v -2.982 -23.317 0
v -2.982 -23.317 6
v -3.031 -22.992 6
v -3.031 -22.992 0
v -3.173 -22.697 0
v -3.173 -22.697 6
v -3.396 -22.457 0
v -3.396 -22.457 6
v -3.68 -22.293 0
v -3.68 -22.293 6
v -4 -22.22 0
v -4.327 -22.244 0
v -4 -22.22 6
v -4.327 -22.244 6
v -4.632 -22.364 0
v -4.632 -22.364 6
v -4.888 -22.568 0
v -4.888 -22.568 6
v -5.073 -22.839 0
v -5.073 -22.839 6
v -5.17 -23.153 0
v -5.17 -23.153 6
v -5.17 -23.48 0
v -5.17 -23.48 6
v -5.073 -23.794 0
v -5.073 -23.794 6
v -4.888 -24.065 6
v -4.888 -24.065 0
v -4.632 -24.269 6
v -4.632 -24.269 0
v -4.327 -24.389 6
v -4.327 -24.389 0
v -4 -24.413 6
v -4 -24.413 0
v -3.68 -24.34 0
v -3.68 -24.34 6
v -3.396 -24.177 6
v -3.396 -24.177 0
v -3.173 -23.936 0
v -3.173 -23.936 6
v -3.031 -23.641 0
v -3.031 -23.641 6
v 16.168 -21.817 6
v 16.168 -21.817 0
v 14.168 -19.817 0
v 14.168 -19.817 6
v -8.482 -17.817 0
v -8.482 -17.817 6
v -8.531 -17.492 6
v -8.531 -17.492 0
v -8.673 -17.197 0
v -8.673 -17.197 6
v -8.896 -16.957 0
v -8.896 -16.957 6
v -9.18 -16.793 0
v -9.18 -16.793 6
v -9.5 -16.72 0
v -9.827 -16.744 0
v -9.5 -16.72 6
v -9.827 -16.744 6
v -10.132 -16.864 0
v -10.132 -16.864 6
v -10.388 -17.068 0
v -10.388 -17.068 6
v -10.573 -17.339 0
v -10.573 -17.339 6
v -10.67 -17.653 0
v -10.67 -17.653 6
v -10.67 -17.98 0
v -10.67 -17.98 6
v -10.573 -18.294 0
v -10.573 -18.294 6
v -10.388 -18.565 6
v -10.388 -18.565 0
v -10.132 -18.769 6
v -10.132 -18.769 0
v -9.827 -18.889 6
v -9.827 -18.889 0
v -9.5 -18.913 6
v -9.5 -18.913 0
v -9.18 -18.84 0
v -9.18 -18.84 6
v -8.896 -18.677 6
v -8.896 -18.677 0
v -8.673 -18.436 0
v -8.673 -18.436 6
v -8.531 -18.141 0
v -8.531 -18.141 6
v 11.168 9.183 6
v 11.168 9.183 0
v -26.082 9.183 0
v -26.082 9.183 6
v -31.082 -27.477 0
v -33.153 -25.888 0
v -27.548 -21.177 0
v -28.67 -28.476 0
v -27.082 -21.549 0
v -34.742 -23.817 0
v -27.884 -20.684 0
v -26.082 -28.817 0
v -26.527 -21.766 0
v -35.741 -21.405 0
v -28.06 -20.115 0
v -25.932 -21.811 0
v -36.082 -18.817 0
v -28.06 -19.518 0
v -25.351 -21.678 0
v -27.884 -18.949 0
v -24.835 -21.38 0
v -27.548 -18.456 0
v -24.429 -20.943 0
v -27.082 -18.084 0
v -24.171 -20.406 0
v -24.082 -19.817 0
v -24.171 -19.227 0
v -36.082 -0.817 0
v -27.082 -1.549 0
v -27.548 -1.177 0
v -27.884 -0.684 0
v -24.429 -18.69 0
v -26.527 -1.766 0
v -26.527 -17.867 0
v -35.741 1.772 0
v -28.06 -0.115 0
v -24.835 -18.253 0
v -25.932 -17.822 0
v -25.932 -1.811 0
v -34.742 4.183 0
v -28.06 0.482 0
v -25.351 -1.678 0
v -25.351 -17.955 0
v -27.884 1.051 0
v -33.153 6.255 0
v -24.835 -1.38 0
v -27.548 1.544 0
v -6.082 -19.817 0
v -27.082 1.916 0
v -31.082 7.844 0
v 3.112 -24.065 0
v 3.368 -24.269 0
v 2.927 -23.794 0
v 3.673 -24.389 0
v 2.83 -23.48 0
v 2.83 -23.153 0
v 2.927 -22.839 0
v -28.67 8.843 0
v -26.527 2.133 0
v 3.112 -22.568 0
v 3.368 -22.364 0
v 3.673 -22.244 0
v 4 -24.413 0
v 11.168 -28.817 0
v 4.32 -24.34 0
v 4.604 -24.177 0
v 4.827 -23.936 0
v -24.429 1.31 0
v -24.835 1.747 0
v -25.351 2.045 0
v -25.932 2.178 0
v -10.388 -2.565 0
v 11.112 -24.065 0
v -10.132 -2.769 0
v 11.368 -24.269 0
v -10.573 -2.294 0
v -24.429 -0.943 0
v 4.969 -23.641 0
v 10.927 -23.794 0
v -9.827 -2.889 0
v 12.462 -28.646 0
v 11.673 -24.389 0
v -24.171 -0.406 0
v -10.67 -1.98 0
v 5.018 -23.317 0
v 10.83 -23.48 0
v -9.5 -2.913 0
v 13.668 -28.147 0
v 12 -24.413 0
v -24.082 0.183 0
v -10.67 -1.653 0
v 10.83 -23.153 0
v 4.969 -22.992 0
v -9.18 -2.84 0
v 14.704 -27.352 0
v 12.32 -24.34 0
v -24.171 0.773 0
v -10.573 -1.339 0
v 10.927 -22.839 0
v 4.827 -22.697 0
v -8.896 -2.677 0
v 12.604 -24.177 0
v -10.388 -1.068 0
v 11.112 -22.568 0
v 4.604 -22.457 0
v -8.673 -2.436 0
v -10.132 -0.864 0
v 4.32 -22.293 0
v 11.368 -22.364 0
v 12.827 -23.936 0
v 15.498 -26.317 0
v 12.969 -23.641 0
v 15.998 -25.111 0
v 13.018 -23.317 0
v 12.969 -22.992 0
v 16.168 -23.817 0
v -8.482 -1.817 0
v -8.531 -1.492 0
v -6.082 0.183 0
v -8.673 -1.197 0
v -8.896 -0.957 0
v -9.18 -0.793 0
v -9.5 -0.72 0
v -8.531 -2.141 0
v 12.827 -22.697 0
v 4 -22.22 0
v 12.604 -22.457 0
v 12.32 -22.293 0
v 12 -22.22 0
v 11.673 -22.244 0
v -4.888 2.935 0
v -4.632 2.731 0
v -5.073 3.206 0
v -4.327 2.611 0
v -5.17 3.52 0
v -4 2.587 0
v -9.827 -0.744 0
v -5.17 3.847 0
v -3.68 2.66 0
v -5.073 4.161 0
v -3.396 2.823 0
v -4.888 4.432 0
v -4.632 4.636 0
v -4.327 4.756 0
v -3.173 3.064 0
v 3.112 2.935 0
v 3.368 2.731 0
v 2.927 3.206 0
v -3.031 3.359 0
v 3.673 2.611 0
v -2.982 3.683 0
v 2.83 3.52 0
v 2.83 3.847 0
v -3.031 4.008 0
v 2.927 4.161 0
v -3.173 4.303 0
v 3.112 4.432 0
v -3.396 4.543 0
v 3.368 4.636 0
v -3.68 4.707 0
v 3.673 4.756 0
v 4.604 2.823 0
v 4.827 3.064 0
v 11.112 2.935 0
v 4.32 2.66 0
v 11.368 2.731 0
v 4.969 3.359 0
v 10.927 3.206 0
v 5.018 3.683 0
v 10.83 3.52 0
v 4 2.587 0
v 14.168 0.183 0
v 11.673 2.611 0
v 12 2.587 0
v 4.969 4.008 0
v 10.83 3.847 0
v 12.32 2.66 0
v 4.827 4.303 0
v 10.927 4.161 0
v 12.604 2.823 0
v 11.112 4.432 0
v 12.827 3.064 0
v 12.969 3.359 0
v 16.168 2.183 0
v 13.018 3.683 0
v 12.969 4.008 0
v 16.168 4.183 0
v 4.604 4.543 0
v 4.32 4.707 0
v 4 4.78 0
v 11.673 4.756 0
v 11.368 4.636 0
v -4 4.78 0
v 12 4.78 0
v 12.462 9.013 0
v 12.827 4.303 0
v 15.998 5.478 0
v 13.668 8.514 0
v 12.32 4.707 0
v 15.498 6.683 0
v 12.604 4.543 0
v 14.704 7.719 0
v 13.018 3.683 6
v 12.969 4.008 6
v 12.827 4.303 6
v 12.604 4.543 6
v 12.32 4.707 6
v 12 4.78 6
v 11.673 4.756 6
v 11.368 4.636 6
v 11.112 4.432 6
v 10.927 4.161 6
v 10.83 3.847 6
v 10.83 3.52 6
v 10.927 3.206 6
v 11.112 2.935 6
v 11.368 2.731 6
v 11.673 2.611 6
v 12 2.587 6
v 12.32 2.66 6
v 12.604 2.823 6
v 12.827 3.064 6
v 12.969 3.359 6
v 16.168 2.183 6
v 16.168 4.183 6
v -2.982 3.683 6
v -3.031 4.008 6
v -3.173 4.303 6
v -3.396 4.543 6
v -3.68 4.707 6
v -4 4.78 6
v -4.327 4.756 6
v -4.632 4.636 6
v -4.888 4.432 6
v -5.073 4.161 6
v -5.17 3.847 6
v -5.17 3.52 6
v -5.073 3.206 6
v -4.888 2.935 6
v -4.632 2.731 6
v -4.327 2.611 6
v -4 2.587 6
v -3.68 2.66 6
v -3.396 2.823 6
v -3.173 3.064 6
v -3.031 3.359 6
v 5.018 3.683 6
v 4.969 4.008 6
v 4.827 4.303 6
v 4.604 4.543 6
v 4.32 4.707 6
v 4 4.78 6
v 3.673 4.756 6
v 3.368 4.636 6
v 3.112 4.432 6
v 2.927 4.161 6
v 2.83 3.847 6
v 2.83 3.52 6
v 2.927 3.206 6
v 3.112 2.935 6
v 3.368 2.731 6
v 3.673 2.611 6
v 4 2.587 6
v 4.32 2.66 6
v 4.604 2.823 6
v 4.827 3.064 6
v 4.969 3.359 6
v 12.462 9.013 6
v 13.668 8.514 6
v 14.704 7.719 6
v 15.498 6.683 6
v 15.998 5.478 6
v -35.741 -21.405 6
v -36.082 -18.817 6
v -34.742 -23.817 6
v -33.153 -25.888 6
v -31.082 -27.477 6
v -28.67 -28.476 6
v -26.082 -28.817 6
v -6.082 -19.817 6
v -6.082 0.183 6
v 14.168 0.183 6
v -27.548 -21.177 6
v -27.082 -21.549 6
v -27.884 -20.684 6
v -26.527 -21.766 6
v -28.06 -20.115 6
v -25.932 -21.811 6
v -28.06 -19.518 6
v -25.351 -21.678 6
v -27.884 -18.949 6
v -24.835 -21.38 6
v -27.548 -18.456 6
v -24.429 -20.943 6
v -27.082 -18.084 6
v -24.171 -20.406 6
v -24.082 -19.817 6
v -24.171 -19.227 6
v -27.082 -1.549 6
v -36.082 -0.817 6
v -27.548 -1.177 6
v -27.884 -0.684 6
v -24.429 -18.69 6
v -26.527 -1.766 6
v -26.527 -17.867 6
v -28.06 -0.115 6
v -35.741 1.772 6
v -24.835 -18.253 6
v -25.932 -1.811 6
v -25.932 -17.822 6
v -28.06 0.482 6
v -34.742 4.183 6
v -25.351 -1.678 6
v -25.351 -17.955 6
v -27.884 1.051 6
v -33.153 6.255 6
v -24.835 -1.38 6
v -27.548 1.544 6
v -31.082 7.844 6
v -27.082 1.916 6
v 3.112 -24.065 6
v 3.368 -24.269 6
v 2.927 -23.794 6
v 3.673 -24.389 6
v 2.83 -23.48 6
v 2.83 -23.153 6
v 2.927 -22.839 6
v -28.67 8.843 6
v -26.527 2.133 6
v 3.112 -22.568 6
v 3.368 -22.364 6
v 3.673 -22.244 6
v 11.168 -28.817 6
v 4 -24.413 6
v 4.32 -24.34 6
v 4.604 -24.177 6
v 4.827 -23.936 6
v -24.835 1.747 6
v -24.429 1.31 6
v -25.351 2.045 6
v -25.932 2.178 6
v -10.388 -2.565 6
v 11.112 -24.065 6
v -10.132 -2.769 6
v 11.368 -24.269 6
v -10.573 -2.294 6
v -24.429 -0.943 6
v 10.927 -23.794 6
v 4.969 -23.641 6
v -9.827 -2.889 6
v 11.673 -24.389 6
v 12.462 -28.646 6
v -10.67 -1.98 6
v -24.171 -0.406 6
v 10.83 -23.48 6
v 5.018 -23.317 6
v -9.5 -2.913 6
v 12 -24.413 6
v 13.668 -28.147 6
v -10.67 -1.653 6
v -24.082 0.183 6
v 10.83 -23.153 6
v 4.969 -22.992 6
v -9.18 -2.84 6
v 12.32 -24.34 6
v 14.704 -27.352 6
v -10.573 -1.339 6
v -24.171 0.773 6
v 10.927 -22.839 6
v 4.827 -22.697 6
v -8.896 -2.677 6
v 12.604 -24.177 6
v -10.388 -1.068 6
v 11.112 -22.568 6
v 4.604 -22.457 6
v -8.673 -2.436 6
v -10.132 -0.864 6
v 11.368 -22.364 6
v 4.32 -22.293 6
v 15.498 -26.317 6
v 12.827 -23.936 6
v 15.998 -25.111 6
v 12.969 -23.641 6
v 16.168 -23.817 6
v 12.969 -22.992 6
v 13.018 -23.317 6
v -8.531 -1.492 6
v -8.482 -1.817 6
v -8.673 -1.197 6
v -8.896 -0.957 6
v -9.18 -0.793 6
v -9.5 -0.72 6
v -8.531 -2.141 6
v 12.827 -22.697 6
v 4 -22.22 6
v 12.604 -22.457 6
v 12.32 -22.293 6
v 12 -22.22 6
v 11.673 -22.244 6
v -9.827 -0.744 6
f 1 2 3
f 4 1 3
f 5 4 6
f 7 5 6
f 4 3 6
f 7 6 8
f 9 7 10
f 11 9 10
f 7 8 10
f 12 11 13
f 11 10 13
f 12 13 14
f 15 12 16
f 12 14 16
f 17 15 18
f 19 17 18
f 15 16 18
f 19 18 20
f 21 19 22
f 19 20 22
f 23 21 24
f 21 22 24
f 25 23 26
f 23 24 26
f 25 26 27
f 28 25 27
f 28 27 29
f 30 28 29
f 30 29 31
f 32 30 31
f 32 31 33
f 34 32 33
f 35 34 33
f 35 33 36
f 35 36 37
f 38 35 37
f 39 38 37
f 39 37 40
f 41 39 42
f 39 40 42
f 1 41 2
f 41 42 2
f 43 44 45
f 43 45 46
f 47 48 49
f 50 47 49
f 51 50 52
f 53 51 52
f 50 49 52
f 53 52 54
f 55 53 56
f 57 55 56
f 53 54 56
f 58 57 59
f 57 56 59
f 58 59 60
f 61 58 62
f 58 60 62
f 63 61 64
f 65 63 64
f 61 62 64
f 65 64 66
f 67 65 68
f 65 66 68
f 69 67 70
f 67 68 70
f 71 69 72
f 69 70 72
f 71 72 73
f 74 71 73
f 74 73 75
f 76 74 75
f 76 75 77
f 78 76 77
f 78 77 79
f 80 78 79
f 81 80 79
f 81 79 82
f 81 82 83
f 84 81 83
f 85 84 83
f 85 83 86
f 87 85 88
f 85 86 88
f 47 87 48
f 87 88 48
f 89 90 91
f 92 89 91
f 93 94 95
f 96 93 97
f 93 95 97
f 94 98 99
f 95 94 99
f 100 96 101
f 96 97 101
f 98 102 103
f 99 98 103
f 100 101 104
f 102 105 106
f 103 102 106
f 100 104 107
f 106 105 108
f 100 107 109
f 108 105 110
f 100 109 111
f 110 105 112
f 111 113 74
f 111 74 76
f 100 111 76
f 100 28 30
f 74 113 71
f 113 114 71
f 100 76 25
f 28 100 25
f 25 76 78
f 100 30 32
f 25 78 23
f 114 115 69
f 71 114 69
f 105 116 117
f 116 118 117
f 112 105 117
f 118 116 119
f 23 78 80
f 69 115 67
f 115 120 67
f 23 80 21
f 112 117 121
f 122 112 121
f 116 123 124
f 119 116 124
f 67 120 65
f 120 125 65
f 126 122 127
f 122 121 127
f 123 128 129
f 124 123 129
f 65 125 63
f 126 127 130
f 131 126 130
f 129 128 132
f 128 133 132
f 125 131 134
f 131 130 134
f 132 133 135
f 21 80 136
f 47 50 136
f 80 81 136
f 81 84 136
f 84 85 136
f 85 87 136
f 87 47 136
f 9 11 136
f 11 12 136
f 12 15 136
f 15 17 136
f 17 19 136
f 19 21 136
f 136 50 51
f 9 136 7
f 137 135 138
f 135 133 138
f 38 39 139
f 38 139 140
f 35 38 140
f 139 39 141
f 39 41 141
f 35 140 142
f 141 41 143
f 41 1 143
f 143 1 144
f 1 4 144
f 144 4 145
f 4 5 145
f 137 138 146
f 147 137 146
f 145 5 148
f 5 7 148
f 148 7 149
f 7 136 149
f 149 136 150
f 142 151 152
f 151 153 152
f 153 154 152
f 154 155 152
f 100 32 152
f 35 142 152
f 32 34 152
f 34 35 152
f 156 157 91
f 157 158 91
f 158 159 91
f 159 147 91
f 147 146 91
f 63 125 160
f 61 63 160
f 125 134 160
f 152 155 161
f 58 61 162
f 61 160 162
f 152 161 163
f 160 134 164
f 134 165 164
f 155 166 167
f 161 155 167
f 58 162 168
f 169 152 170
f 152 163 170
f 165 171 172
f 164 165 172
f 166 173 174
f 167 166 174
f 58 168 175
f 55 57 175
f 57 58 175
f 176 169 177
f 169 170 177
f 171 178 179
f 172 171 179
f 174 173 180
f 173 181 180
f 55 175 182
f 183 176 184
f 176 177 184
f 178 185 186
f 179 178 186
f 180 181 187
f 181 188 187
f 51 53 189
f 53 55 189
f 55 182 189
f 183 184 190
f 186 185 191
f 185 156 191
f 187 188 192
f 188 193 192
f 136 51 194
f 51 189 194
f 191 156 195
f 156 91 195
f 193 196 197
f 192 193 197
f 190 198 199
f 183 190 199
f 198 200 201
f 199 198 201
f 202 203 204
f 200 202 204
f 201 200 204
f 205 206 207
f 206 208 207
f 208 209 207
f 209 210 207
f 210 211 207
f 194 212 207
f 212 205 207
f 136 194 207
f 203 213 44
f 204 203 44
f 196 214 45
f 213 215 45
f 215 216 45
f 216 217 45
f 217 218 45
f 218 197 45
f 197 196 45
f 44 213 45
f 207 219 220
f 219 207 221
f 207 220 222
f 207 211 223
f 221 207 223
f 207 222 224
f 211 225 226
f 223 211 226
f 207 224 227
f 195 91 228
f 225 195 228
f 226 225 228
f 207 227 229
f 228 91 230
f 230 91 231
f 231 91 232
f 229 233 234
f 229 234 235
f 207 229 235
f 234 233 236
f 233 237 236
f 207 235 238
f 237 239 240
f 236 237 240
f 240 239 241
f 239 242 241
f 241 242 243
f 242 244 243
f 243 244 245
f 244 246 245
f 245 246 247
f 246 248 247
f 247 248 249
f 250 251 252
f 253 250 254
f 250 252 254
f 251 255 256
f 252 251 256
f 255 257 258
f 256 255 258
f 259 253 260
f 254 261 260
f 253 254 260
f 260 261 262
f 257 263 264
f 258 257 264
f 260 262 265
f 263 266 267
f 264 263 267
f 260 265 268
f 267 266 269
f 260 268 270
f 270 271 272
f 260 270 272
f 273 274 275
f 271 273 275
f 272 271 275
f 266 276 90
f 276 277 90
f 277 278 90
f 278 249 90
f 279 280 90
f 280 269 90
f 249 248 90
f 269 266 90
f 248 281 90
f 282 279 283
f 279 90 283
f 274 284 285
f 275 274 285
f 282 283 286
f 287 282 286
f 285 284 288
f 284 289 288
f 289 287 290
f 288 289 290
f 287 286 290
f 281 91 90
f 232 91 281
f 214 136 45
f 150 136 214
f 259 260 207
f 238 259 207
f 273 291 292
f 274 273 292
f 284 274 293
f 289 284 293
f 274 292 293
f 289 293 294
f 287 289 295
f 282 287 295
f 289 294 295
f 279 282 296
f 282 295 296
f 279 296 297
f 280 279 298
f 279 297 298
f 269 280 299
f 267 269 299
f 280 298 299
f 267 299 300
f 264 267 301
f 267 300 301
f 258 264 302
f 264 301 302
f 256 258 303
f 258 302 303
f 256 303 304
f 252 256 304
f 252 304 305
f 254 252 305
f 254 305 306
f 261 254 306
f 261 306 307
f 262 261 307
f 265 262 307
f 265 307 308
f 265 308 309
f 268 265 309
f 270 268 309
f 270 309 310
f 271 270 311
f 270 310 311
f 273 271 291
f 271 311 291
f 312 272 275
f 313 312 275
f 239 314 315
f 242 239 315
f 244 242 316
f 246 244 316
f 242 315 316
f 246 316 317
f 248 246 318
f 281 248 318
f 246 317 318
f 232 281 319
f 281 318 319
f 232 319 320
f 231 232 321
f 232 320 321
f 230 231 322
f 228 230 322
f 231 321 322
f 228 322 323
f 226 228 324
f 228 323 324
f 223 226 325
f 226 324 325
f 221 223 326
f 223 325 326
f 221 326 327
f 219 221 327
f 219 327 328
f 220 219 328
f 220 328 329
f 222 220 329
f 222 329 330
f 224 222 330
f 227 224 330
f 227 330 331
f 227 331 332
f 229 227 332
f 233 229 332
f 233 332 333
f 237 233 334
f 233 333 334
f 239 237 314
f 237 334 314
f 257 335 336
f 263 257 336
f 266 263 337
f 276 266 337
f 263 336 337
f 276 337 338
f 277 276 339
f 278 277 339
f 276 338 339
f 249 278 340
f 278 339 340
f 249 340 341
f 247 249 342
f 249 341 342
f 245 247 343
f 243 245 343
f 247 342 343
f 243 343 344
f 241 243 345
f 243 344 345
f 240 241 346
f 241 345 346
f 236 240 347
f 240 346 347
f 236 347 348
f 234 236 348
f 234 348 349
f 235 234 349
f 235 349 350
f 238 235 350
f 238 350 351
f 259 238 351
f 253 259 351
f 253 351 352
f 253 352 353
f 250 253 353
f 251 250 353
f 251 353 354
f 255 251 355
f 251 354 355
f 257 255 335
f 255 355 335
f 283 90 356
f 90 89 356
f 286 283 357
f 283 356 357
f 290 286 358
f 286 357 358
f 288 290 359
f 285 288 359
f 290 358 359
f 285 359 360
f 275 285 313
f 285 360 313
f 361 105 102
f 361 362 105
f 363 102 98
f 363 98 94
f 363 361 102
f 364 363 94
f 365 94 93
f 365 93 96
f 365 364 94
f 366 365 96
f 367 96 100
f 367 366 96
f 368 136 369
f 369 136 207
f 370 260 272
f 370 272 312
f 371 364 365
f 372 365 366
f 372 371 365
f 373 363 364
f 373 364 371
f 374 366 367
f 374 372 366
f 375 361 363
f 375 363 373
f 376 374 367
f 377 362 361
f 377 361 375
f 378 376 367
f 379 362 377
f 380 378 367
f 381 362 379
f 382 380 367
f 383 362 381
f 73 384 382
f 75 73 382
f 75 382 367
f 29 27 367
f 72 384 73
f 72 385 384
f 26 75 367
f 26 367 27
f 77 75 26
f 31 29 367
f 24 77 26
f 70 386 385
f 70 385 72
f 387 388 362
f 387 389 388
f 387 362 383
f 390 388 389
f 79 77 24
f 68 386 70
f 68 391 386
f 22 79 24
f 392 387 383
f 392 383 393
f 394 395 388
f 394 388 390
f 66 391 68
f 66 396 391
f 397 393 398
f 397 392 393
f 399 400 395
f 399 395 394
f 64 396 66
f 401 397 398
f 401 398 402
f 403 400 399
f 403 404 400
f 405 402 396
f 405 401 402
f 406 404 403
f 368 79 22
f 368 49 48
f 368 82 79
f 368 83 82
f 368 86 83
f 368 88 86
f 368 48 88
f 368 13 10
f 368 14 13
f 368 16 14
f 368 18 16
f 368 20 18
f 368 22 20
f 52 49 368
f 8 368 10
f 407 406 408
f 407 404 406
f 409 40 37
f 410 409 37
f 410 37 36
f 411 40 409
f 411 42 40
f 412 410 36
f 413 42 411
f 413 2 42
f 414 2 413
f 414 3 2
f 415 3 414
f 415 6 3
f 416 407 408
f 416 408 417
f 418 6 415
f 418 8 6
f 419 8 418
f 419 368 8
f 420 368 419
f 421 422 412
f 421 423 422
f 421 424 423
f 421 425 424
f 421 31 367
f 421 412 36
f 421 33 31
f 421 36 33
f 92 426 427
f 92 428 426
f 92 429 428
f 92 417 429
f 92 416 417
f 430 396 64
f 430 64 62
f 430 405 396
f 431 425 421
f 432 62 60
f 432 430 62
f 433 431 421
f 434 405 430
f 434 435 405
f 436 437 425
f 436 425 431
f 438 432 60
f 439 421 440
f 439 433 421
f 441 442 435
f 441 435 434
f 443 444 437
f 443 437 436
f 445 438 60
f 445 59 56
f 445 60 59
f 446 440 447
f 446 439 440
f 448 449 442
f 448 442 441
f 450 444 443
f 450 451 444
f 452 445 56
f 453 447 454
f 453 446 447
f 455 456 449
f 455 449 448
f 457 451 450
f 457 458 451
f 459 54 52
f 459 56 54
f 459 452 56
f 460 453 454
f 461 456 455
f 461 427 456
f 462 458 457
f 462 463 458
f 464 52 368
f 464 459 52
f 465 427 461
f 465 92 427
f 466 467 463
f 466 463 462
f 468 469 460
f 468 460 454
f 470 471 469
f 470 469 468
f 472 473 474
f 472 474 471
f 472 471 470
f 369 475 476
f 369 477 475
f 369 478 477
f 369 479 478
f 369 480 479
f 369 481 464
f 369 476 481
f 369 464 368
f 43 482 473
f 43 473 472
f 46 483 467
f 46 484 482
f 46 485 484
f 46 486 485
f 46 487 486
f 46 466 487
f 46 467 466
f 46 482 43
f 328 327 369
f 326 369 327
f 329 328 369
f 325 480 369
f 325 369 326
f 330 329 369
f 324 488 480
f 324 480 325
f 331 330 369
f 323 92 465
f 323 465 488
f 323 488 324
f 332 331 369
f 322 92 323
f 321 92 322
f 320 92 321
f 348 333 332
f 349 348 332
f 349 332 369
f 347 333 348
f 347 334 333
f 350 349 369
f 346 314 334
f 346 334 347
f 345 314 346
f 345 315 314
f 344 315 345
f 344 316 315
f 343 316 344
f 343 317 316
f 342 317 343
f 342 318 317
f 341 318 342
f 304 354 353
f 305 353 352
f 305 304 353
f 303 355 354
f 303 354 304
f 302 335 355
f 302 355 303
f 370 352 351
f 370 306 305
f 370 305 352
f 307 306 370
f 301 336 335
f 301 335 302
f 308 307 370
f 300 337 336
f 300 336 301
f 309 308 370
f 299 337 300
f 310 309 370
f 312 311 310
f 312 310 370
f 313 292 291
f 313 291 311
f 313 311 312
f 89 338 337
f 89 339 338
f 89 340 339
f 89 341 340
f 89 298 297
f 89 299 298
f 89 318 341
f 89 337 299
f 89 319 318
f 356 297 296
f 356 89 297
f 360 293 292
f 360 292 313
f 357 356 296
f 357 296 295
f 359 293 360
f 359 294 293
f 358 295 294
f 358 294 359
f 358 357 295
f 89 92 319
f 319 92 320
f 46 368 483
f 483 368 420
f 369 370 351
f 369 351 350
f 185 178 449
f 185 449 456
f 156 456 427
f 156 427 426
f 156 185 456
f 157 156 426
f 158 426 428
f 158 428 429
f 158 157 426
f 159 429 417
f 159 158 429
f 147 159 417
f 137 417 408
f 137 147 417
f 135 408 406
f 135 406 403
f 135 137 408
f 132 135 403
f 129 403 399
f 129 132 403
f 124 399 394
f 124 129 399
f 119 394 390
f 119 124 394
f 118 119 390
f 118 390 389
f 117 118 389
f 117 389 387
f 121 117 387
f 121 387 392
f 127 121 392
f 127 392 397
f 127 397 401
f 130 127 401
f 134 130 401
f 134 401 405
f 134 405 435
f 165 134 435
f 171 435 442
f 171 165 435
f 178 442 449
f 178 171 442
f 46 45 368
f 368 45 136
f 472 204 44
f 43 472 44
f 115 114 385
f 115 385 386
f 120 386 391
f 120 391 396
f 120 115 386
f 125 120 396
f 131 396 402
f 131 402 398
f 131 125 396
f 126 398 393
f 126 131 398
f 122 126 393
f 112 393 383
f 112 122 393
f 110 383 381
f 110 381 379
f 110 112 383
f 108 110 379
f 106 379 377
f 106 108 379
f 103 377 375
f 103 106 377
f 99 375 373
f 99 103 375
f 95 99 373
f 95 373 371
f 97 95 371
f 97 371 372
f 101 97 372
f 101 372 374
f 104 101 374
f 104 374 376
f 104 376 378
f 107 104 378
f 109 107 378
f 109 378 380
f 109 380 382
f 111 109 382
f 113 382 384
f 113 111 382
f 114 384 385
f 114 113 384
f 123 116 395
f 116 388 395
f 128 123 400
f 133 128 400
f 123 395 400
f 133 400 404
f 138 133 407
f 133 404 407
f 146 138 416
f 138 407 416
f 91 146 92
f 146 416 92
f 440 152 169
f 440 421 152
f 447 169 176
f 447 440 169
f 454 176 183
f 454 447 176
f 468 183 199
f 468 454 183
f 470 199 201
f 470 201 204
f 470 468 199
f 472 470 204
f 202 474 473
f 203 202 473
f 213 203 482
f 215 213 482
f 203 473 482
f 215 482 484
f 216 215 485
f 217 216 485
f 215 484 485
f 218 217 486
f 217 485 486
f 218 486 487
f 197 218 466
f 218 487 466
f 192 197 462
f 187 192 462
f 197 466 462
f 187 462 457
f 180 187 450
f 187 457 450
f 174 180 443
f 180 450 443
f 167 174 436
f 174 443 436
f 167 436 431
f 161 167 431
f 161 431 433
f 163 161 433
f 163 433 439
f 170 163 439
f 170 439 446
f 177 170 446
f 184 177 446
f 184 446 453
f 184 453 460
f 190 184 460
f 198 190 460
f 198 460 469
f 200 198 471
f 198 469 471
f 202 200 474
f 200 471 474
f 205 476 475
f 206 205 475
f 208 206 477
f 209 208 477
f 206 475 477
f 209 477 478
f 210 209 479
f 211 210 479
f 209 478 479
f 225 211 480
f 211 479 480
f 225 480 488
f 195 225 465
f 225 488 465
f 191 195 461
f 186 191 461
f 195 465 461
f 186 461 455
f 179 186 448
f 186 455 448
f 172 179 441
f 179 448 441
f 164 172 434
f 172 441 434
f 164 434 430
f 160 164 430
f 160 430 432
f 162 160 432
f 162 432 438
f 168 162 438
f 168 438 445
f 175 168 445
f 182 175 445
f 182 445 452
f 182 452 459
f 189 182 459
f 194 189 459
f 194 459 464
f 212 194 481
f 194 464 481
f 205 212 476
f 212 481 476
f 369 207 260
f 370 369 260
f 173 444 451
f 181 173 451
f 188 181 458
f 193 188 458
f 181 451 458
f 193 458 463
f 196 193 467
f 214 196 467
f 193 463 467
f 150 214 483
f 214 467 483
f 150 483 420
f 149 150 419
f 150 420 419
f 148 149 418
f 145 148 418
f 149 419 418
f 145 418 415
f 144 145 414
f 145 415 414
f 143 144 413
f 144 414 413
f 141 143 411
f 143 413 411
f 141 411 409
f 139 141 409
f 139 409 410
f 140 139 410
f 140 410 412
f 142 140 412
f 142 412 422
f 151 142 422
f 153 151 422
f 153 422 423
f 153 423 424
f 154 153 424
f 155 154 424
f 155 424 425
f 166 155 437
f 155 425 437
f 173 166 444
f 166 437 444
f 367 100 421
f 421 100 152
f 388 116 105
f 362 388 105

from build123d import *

# Parameters (mm, degrees)
ESQUISSE1_R             = 2
BOSS_EXTRU_1_DEPTH      = 6
CONG_1_R                = 10
CONG_2_R                = 5
CHANFREIN1_SIZE         = 2
ESQUISSE2_R             = 1.1
ENL_V_MAT_EXTRU_1_DEPTH = 6


with BuildPart() as part:
    # Esquisse1 → Boss.-Extru.1 (new body)
    with BuildSketch(Plane.XY):
        Polygon((-36.081854409, 9.183471646), (-36.081854409, -28.816528354), (16.168145591, -28.816528354), (16.168145591, -19.816528354), (-6.081854409, -19.816528354), (-6.081854409, 0.183471646), (16.168145591, 0.183471646), (16.168145591, 9.183471646), align=None)
        with Locations((-26.081854409, 0.183471646)):
            Circle(ESQUISSE1_R, mode=Mode.SUBTRACT)
        with Locations((-26.081854409, -19.816528354)):
            Circle(ESQUISSE1_R, mode=Mode.SUBTRACT)
    extrude(amount=BOSS_EXTRU_1_DEPTH)

    # Congé1
    cong_1_edges = [part.edges().sort_by_distance(p)[0] for p in [
        (-36.081854409, -28.816528354, 3),
        (-36.081854409, 9.183471646, 3),
    ]]
    fillet(cong_1_edges, radius=CONG_1_R)

    # Congé2
    cong_2_edges = [part.edges().sort_by_distance(p)[0] for p in [
        (16.168145591, 9.183471646, 3),
        (16.168145591, -28.816528354, 3),
    ]]
    fillet(cong_2_edges, radius=CONG_2_R)

    # Chanfrein1
    chanfrein1_edges = [part.edges().sort_by_distance(p)[0] for p in [
        (16.168145591, 0.183471646, 3),
        (16.168145591, -19.816528354, 3),
    ]]
    chamfer(chanfrein1_edges, length=CHANFREIN1_SIZE)

    # Esquisse2 → Enlèv. mat.-Extru.1 (cut)
    with BuildSketch(Plane.XY.offset(6)):
        with Locations((-4.081854409, 3.683471646)):
            Circle(ESQUISSE2_R)
        with Locations((3.918145591, 3.683471646)):
            Circle(ESQUISSE2_R)
        with Locations((11.918145591, 3.683471646)):
            Circle(ESQUISSE2_R)
        with Locations((-9.581854409, -1.816528354)):
            Circle(ESQUISSE2_R)
        with Locations((-9.581854409, -17.816528354)):
            Circle(ESQUISSE2_R)
        with Locations((-4.081854409, -23.316528354)):
            Circle(ESQUISSE2_R)
        with Locations((3.918145591, -23.316528354)):
            Circle(ESQUISSE2_R)
        with Locations((11.918145591, -23.316528354)):
            Circle(ESQUISSE2_R)
    extrude(amount=-ENL_V_MAT_EXTRU_1_DEPTH, mode=Mode.SUBTRACT)


solid = part.part
